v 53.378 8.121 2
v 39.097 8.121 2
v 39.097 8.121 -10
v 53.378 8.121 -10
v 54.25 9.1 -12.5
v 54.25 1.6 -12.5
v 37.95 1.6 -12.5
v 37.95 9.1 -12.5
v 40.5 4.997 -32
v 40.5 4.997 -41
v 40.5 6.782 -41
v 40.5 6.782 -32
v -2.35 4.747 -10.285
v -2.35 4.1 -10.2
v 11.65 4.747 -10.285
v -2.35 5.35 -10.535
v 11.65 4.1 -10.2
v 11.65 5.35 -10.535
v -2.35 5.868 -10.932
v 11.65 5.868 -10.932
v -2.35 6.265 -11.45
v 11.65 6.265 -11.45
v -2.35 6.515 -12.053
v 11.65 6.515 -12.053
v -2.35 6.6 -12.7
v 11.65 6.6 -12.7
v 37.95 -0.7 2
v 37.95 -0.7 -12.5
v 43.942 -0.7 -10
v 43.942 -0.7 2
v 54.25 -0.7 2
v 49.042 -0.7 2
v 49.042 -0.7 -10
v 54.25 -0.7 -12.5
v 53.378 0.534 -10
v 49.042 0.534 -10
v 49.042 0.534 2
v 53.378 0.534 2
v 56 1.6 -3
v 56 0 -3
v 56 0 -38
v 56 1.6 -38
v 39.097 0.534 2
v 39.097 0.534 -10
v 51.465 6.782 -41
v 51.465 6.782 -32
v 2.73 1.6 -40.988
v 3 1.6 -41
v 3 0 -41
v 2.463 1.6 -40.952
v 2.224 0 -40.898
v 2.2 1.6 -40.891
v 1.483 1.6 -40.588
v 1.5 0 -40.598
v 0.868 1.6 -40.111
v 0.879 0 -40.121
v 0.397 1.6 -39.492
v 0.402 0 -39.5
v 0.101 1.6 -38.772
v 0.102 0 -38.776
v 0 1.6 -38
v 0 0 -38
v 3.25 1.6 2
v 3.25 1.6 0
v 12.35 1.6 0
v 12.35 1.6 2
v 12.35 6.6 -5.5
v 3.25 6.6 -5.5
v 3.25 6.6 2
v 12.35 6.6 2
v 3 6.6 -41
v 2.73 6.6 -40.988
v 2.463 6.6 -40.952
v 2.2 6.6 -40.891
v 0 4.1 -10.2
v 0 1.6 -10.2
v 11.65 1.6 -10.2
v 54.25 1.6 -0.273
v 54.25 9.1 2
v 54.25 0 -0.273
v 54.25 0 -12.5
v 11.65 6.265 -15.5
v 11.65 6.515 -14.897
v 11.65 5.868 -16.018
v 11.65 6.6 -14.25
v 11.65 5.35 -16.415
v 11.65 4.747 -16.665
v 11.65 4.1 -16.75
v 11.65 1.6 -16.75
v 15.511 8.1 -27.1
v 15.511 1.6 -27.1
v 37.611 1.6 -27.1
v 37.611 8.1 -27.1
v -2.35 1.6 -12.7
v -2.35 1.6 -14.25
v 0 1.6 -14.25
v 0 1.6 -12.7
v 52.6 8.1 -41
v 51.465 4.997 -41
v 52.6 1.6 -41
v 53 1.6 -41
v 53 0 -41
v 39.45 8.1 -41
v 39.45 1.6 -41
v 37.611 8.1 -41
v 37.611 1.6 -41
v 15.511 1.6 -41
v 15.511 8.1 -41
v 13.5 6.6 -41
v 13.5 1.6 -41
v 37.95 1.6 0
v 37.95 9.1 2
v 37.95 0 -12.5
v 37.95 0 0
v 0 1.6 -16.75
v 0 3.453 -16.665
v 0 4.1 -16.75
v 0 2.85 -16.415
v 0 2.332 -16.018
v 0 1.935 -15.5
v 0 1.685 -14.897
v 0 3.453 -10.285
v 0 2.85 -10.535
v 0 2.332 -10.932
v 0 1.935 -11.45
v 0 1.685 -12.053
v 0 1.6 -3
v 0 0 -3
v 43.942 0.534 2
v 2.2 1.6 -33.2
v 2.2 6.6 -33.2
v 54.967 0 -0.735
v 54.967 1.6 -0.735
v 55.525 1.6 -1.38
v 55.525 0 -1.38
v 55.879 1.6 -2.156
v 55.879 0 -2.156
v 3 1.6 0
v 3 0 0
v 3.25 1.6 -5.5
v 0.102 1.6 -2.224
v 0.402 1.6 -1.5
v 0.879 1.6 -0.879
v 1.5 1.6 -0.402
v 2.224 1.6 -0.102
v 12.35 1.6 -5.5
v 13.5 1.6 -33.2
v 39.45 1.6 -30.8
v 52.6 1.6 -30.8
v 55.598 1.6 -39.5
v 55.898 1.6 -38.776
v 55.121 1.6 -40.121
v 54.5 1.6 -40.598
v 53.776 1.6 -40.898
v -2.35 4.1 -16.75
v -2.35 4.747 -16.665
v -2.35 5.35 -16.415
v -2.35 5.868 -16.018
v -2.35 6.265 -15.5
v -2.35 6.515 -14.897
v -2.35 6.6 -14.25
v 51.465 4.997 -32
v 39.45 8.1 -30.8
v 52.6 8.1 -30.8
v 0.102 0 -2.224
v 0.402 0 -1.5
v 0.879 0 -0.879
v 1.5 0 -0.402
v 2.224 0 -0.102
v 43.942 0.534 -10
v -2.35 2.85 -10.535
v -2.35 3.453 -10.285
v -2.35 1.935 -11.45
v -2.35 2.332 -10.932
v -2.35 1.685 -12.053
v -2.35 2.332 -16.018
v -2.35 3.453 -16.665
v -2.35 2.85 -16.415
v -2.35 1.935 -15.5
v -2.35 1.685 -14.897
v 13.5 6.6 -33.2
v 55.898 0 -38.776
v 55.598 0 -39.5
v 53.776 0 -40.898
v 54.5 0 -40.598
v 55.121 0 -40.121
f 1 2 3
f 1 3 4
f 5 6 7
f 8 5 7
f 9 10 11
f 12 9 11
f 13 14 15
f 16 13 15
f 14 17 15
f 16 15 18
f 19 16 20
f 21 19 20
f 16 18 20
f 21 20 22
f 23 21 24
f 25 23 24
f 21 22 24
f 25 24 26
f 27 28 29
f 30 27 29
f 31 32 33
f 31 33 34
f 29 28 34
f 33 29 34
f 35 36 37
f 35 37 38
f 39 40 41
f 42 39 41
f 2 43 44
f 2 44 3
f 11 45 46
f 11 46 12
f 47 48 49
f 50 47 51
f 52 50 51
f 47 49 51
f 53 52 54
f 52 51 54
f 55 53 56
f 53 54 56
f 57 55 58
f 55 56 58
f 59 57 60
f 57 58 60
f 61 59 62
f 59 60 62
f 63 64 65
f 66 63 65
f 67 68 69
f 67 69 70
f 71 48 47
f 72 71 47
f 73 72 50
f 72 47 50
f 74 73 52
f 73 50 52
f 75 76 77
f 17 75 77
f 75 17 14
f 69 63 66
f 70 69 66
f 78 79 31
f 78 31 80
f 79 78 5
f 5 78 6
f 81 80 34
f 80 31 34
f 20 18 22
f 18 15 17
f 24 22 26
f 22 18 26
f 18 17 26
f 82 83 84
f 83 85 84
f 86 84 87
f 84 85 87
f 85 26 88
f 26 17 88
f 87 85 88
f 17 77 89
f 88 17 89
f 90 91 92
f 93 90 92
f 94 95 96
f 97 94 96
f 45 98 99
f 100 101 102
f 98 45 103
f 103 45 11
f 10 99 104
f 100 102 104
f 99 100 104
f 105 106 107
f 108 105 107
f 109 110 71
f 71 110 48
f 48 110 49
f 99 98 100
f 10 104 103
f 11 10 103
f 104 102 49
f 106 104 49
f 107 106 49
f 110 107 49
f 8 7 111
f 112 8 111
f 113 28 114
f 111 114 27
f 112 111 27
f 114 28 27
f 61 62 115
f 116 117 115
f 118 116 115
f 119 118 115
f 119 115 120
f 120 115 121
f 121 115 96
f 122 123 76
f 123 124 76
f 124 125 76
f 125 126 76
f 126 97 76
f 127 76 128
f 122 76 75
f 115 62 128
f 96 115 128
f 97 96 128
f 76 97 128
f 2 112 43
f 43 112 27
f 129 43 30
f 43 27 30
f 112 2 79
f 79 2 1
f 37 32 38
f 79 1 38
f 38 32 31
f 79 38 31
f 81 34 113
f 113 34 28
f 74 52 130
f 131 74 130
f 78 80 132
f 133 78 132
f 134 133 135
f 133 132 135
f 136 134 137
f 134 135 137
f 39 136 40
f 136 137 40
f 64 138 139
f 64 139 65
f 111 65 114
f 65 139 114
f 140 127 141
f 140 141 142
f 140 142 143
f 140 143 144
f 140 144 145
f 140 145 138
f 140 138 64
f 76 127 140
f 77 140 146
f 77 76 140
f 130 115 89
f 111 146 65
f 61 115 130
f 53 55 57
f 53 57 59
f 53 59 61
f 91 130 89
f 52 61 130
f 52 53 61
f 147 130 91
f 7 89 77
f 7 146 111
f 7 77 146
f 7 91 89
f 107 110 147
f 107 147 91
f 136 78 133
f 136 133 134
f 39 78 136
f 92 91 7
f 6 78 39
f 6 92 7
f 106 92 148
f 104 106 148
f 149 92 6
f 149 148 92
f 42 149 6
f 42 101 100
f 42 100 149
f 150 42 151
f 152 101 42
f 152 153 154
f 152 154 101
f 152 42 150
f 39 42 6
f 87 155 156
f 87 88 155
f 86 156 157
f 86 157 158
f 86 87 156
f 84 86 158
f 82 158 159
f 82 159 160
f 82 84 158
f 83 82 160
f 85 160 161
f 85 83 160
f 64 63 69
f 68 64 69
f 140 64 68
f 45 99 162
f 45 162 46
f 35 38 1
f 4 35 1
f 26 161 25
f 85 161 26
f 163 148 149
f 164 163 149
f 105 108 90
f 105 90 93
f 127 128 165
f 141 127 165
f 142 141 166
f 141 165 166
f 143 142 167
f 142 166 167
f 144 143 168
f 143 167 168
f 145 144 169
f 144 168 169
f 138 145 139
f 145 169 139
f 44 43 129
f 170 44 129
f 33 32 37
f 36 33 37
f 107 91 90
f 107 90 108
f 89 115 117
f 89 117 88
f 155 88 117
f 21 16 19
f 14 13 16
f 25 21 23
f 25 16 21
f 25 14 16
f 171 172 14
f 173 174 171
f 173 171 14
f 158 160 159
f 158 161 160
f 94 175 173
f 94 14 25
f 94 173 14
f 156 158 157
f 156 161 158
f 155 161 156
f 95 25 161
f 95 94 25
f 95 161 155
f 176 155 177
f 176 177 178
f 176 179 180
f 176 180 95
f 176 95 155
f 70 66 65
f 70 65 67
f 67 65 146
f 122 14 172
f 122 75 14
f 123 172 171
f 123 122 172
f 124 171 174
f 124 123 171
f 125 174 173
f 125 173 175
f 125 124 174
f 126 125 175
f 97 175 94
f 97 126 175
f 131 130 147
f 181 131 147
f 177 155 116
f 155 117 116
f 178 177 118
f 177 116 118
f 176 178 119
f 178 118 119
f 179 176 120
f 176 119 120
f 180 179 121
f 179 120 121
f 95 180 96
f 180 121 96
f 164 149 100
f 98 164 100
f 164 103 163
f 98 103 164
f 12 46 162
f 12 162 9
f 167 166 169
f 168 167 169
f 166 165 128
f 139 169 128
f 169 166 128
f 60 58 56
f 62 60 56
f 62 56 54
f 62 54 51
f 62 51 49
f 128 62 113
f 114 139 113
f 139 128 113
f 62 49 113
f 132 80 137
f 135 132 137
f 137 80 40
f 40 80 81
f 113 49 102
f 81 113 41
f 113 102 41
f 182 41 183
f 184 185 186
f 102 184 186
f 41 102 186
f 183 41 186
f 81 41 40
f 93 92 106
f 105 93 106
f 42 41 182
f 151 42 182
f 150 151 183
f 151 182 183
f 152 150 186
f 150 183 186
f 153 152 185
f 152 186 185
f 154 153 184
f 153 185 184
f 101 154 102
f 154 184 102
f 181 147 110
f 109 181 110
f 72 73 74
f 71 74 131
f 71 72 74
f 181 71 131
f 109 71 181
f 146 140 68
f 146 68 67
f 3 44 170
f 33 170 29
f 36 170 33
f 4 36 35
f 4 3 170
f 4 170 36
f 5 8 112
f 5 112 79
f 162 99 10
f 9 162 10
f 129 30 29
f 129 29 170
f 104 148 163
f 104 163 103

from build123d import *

# Parameters (mm, degrees)
BOSS_EXTRUDE1_DEPTH      = 1.6
BOSS_EXTRUDE2_DEPTH      = 9.1
BOSS_EXTRUDE2_DEPTH_BACK = 0.7
BOSS_EXTRUDE3_START      = 1.6
SKETCH1_4_W              = 22.1
SKETCH1_4_H              = 13.9
SKETCH1_4_W_2            = 13.15
SKETCH1_4_H_2            = 10.2
BOSS_EXTRUDE3_DEPTH      = 6.5
BOSS_EXTRUDE4_START      = 1.6
SKETCH1_5_W              = 9.1
SKETCH1_5_H              = 7.5
SKETCH1_5_W_2            = 14
SKETCH1_5_H_2            = 6.55
BOSS_EXTRUDE4_DEPTH      = 5
SKETCH2_W                = 10.965284592
SKETCH2_H                = 1.785046329
CUT_EXTRUDE1_DEPTH       = 9
SKETCH3_W                = 5.100132369
SKETCH3_H                = 1.23427986
SKETCH3_W_2              = 14.280370632
SKETCH3_H_2              = 7.586446898
CUT_EXTRUDE2_DEPTH       = 12
FILLET1_R                = 2.5


with BuildPart() as part:
    # Sketch1 → Boss-Extrude1 (new body)
    with BuildSketch(Plane(origin=(0, 0, 0), x_dir=(1, 0, 0), z_dir=(0, 1, 0))):
        with BuildLine():
            ThreePointArc((0, 3), (0.878679656, 0.878679656), (3, 0))
            Line((3, 0), (53, 0))
            ThreePointArc((53, 0), (55.121320344, 0.878679656), (56, 3))
            Line((56, 3), (56, 38))
            ThreePointArc((56, 38), (55.121320344, 40.121320344), (53, 41))
            Line((53, 41), (3, 41))
            ThreePointArc((3, 41), (0.878679656, 40.121320344), (0, 38))
            Line((0, 38), (0, 3))
        make_face()
    extrude(amount=BOSS_EXTRUDE1_DEPTH)

    # Sketch1<3> → Boss-Extrude2 (add, two sides: drawn at the far end of the back side and taken through both)
    with BuildSketch(Plane(origin=(0, 0, 0), x_dir=(1, 0, 0), z_dir=(0, 1, 0)).offset(-BOSS_EXTRUDE2_DEPTH_BACK)):
        with BuildLine():
            Line((37.95, 12.5), (37.95, 0))
            Line((37.95, 0), (53, 0))
            ThreePointArc((53, 0), (53.639713183, 0.068998969), (54.25, 0.272821971))
            Line((54.25, 0.272821971), (54.25, 12.5))
            Line((54.25, 12.5), (37.95, 12.5))
        make_face()
        with BuildLine():
            Line((53, 0), (37.95, 0))
            Line((37.95, 0), (37.95, -2))
            Line((37.95, -2), (54.25, -2))
            Line((54.25, -2), (54.25, 0.272821971))
            ThreePointArc((54.25, 0.272821971), (53.639713183, 0.068998969), (53, 0))
        make_face()
    extrude(amount=BOSS_EXTRUDE2_DEPTH + BOSS_EXTRUDE2_DEPTH_BACK)

    # Sketch1<4> → Boss-Extrude3 (add)
    with BuildSketch(Plane(origin=(0, 0, 0), x_dir=(1, 0, 0), z_dir=(0, 1, 0)).offset(BOSS_EXTRUDE3_START)):
        with Locations((26.561479759, 34.05)):
            Rectangle(SKETCH1_4_W, SKETCH1_4_H)
        with Locations((46.025, 35.9)):
            Rectangle(SKETCH1_4_W_2, SKETCH1_4_H_2)
    extrude(amount=BOSS_EXTRUDE3_DEPTH)

    # Sketch1<5> → Boss-Extrude4 (add)
    with BuildSketch(Plane(origin=(0, 0, 0), x_dir=(1, 0, 0), z_dir=(0, 1, 0)).offset(BOSS_EXTRUDE4_START)):
        with Locations((7.8, 1.75)):
            Rectangle(SKETCH1_5_W, SKETCH1_5_H)
        with Locations((4.65, 13.475)):
            Rectangle(SKETCH1_5_W_2, SKETCH1_5_H_2)
        with BuildLine():
            ThreePointArc((3, 41), (2.596328956, 40.972717559), (2.2, 40.891366459))
            Line((2.2, 40.891366459), (2.2, 33.2))
            Line((2.2, 33.2), (13.5, 33.2))
            Line((13.5, 33.2), (13.5, 41))
            Line((13.5, 41), (3, 41))
        make_face()
    extrude(amount=BOSS_EXTRUDE4_DEPTH)

    # Sketch2 → Cut-Extrude1 (cut)
    with BuildSketch(Plane(origin=(0, 0, -41), x_dir=(-1, 0, 0), z_dir=(0, 0, -1))):
        with Locations((-45.98237221, 5.889418847)):
            Rectangle(SKETCH2_W, SKETCH2_H)
    extrude(amount=-CUT_EXTRUDE1_DEPTH, mode=Mode.SUBTRACT)

    # Sketch3 → Cut-Extrude2 (cut)
    with BuildSketch(Plane.XY.offset(2)):
        with Locations((46.492385447, -0.08286007)):
            Rectangle(SKETCH3_W, SKETCH3_H)
        with Locations((46.237378828, 4.327503309)):
            Rectangle(SKETCH3_W_2, SKETCH3_H_2)
    extrude(amount=-CUT_EXTRUDE2_DEPTH, mode=Mode.SUBTRACT)

    # Fillet1
    fillet1_edges = [part.edges().sort_by_distance(p)[0] for p in [
        (-1.175, 1.6, -16.75),
        (-1.175, 1.6, -10.2),
        (4.65, 6.6, -16.75),
        (4.65, 6.6, -10.2),
    ]]
    fillet(fillet1_edges, radius=FILLET1_R - 0.0001)  # a hair under: the kernel refuses the full size


solid = part.part
